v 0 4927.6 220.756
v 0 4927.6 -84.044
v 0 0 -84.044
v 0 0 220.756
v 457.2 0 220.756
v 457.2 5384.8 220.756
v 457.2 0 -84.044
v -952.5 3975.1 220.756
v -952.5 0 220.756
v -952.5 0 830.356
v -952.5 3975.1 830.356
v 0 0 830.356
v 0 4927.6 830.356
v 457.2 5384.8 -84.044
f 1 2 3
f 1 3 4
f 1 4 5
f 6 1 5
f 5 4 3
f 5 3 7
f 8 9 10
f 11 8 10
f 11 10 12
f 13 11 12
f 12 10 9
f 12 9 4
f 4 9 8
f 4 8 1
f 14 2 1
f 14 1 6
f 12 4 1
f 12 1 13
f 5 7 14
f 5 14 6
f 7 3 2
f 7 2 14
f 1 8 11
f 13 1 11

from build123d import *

# Parameters (mm, degrees)
F0_W        = 457.2
F0_H        = 304.8
F2_DEPTH    = 5410.2
F1_W        = 952.5
F1_H        = 609.6
F3_DEPTH    = 4927.6
F4_T1_DEPTH = 2786.9884199847
F5_SIZE     = 952.49999


# Not quite as in the source:
# - a fillet or chamfer that OpenCascade refuses, or shapes differently, is made with other operations: its cross-section is extruded or revolved along the edge and cut away or added
# - a fillet or chamfer is up to 0.001 mm smaller than in the source, because OpenCascade refuses the exact size


with BuildPart() as f2:
    # F0 (on Front) → F2 (new body)
    with BuildSketch(Plane.XZ):
        with Locations((228.6, 68.3558752648)):
            Rectangle(F0_W, F0_H)
    extrude(amount=-F2_DEPTH)

    # F4: chamfer of 482.6 on 1 edges, made by hand

    # F4_s2 → F4_t1 (cut)
    with BuildSketch(Plane.XY.offset(-1325.1383347275)):
        Polygon((0, 4927.6), (482.6, 5410.2), (0, 5410.2), align=None)
    extrude(amount=F4_T1_DEPTH, mode=Mode.SUBTRACT)


with BuildPart() as f3:
    # F1 (on face) → F3 (new body)
    with BuildSketch(Plane.XZ):
        with Locations((-476.25, 525.5558752648)):
            Rectangle(F1_W, F1_H)
    extrude(amount=-F3_DEPTH)

    # F5 (size 952.5 in the source; OpenCascade refuses exactly that, so slightly less here)
    f5_edges = [f3.edges().sort_by_distance(p)[0] for p in [
        (-952.5, 4927.6, 525.555875),
    ]]
    chamfer(f5_edges, length=F5_SIZE)


solid = Compound([f2.part, f3.part])
